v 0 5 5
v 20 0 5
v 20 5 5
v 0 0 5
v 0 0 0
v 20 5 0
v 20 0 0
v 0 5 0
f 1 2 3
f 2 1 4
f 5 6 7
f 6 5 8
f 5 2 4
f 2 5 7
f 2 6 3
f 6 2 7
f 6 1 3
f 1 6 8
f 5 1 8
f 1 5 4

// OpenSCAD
// Generated by generate_scads.py
cube(size=[20,5,5], center=false);
